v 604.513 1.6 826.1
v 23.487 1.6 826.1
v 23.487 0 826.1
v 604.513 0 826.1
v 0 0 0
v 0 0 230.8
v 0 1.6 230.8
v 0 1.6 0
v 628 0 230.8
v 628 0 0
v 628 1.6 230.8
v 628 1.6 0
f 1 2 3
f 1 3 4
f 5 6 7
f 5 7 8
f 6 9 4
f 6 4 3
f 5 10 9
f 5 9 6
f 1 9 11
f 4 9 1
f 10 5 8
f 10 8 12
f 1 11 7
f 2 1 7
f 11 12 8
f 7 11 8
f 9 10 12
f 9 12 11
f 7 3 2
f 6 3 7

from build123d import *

# Parameters (mm, degrees)
BOSS_EXTRUDE3_DEPTH = 1.6
CUT_EXTRUDE3_DEPTH  = 1249.077106674


with BuildPart() as part:
    # Sketch5 → Boss-Extrude3 (new body)
    with BuildSketch(Plane(origin=(0, 0, 0), x_dir=(1, 0, 0), z_dir=(0, 1, 0))):
        Polygon((0, 0), (628, 0), (628, -230.8), (604.512792249, -826.1), (509.77, -1078.56845133), (118.23, -1078.56845133), (23.487207751, -826.1), (0, -230.8), align=None)
    extrude(amount=BOSS_EXTRUDE3_DEPTH)

    # Sketch6 → Cut-Extrude3 (cut, through all)
    with BuildSketch(Plane(origin=(0, 1.6, 0), x_dir=(1, 0, 0), z_dir=(0, 1, 0))):
        Polygon((23.487207751, -826.1), (604.512792249, -826.1), (509.77, -1078.56845133), (118.23, -1078.56845133), align=None)
    extrude(amount=-CUT_EXTRUDE3_DEPTH, mode=Mode.SUBTRACT)


solid = part.part
